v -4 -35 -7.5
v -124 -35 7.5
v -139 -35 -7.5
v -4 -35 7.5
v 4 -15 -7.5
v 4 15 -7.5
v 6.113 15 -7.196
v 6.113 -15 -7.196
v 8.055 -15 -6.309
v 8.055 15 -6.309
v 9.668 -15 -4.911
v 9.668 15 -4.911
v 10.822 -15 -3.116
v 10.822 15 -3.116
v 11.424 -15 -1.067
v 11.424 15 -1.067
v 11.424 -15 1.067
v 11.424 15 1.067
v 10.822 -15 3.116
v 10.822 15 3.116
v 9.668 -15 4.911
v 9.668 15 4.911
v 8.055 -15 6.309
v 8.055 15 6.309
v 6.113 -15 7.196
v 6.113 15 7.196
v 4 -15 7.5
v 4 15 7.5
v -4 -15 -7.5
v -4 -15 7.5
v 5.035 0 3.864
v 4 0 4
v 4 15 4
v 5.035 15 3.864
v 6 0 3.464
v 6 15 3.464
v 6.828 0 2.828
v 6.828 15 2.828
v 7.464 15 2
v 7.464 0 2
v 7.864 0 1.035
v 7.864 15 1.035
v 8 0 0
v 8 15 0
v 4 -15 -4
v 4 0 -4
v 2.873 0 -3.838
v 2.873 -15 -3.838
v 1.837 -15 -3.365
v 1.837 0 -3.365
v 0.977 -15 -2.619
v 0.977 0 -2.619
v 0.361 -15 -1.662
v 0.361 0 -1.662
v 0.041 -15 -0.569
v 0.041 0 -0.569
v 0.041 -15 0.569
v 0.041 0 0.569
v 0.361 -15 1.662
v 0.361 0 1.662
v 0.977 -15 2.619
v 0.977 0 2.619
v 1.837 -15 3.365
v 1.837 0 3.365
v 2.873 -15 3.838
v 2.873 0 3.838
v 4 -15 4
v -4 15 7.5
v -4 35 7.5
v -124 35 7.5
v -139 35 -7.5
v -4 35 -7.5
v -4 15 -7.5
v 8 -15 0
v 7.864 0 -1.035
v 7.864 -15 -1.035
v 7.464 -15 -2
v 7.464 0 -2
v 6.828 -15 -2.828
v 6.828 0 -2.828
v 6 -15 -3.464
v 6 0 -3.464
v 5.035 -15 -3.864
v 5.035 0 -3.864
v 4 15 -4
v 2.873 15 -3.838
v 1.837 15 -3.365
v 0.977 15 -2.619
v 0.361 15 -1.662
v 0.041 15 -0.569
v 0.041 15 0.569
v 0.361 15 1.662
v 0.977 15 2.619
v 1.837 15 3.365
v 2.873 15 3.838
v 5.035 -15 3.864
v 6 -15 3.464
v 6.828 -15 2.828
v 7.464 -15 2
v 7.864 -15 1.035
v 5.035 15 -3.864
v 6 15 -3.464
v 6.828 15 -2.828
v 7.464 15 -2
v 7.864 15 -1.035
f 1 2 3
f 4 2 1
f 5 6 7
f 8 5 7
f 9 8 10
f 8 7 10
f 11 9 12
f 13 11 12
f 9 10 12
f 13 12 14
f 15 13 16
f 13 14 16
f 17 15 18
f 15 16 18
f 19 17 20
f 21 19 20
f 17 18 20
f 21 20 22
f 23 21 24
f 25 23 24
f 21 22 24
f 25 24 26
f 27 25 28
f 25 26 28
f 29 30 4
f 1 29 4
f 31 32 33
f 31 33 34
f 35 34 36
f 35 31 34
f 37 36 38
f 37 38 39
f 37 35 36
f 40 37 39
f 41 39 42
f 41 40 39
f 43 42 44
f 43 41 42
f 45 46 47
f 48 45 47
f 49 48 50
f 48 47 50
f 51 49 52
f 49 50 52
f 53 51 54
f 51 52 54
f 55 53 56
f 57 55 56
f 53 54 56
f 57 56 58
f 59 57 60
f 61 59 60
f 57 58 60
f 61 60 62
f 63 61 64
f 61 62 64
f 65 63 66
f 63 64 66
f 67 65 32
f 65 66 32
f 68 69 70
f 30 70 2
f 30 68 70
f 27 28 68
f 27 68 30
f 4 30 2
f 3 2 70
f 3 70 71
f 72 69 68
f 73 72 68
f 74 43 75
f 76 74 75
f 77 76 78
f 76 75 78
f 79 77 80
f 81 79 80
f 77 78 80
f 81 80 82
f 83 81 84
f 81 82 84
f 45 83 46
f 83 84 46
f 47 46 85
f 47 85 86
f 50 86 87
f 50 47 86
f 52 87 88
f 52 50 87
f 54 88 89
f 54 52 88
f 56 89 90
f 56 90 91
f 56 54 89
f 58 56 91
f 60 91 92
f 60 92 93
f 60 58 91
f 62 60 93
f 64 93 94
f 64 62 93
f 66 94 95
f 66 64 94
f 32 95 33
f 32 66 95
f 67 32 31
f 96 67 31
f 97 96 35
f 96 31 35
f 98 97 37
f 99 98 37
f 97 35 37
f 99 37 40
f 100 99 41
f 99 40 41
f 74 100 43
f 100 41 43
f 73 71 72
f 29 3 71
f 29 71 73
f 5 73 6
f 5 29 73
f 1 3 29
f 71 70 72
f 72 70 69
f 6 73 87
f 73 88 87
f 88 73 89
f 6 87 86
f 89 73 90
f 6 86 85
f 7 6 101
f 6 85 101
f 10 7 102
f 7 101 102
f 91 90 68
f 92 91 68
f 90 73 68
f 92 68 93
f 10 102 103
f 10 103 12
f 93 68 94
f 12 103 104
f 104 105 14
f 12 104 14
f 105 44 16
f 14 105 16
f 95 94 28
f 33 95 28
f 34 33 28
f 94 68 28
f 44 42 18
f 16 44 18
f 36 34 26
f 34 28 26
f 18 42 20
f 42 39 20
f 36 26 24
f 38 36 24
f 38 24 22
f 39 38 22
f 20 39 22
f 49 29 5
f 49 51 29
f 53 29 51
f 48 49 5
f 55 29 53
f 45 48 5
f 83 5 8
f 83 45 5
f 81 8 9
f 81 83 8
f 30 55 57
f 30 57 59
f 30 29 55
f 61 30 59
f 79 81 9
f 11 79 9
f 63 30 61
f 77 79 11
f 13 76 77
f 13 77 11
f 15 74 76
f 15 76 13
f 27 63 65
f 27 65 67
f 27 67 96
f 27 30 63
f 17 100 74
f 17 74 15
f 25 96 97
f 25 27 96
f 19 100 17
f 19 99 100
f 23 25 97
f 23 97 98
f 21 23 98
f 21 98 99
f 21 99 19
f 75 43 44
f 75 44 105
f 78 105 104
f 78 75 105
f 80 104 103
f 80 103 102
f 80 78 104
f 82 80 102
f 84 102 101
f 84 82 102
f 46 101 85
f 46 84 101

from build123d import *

# Parameters (mm, degrees)
F1_DEPTH = 15
F2_DEPTH = 15
F3_W     = 70
F3_H     = 15
F4_DEPTH = 120
F6_DEPTH = 70


with BuildPart() as f1:
    # F0 (on Front) → F1 (new body)
    with BuildSketch(Plane.XZ):
        with BuildLine():
            Line((4, 7.5), (-4, 7.5))
            Line((-4, 7.5), (-4, -7.5))
            Line((-4, -7.5), (4, -7.5))
            ThreePointArc((4, -7.5), (-3.5, 0), (4, 7.5))
        make_face()
        with BuildLine():
            ThreePointArc((11.5, 0), (9.3033008589, 5.3033008589), (4, 7.5))
            Line((4, 7.5), (4, 4))
            ThreePointArc((4, 4), (6.8284271247, 2.8284271247), (8, 0))
            ThreePointArc((8, 0), (6.8284271247, -2.8284271247), (4, -4))
            Line((4, -4), (4, -7.5))
            ThreePointArc((4, -7.5), (9.3033008589, -5.3033008589), (11.5, 0))
        make_face()
        with BuildLine():
            Line((4, 4), (4, 7.5))
            ThreePointArc((4, 7.5), (-3.5, 0), (4, -7.5))
            Line((4, -7.5), (4, -4))
            ThreePointArc((4, -4), (0, 0), (4, 4))
        make_face()
    extrude(amount=-F1_DEPTH)

    # F2 (add): a face of the model
    f2_faces = [f1.faces().sort_by_distance(p)[0] for p in [
        (0, 0, 7.2843034539),
    ]]
    extrude(f2_faces, amount=F2_DEPTH)

    # F3 (on face) → F4 (join)
    with BuildSketch(Plane(origin=(-4, 0, 0), x_dir=(0, -1, 0), z_dir=(-1, 0, 0))):
        Rectangle(F3_W, F3_H)
    extrude(amount=F4_DEPTH)

    # F5 (on face) → F6 (join)
    with BuildSketch(Plane.XZ.offset(35)):
        Polygon((-139, -7.5), (-124, -7.5), (-124, 7.5), align=None)
    extrude(amount=-F6_DEPTH)


solid = f1.part
